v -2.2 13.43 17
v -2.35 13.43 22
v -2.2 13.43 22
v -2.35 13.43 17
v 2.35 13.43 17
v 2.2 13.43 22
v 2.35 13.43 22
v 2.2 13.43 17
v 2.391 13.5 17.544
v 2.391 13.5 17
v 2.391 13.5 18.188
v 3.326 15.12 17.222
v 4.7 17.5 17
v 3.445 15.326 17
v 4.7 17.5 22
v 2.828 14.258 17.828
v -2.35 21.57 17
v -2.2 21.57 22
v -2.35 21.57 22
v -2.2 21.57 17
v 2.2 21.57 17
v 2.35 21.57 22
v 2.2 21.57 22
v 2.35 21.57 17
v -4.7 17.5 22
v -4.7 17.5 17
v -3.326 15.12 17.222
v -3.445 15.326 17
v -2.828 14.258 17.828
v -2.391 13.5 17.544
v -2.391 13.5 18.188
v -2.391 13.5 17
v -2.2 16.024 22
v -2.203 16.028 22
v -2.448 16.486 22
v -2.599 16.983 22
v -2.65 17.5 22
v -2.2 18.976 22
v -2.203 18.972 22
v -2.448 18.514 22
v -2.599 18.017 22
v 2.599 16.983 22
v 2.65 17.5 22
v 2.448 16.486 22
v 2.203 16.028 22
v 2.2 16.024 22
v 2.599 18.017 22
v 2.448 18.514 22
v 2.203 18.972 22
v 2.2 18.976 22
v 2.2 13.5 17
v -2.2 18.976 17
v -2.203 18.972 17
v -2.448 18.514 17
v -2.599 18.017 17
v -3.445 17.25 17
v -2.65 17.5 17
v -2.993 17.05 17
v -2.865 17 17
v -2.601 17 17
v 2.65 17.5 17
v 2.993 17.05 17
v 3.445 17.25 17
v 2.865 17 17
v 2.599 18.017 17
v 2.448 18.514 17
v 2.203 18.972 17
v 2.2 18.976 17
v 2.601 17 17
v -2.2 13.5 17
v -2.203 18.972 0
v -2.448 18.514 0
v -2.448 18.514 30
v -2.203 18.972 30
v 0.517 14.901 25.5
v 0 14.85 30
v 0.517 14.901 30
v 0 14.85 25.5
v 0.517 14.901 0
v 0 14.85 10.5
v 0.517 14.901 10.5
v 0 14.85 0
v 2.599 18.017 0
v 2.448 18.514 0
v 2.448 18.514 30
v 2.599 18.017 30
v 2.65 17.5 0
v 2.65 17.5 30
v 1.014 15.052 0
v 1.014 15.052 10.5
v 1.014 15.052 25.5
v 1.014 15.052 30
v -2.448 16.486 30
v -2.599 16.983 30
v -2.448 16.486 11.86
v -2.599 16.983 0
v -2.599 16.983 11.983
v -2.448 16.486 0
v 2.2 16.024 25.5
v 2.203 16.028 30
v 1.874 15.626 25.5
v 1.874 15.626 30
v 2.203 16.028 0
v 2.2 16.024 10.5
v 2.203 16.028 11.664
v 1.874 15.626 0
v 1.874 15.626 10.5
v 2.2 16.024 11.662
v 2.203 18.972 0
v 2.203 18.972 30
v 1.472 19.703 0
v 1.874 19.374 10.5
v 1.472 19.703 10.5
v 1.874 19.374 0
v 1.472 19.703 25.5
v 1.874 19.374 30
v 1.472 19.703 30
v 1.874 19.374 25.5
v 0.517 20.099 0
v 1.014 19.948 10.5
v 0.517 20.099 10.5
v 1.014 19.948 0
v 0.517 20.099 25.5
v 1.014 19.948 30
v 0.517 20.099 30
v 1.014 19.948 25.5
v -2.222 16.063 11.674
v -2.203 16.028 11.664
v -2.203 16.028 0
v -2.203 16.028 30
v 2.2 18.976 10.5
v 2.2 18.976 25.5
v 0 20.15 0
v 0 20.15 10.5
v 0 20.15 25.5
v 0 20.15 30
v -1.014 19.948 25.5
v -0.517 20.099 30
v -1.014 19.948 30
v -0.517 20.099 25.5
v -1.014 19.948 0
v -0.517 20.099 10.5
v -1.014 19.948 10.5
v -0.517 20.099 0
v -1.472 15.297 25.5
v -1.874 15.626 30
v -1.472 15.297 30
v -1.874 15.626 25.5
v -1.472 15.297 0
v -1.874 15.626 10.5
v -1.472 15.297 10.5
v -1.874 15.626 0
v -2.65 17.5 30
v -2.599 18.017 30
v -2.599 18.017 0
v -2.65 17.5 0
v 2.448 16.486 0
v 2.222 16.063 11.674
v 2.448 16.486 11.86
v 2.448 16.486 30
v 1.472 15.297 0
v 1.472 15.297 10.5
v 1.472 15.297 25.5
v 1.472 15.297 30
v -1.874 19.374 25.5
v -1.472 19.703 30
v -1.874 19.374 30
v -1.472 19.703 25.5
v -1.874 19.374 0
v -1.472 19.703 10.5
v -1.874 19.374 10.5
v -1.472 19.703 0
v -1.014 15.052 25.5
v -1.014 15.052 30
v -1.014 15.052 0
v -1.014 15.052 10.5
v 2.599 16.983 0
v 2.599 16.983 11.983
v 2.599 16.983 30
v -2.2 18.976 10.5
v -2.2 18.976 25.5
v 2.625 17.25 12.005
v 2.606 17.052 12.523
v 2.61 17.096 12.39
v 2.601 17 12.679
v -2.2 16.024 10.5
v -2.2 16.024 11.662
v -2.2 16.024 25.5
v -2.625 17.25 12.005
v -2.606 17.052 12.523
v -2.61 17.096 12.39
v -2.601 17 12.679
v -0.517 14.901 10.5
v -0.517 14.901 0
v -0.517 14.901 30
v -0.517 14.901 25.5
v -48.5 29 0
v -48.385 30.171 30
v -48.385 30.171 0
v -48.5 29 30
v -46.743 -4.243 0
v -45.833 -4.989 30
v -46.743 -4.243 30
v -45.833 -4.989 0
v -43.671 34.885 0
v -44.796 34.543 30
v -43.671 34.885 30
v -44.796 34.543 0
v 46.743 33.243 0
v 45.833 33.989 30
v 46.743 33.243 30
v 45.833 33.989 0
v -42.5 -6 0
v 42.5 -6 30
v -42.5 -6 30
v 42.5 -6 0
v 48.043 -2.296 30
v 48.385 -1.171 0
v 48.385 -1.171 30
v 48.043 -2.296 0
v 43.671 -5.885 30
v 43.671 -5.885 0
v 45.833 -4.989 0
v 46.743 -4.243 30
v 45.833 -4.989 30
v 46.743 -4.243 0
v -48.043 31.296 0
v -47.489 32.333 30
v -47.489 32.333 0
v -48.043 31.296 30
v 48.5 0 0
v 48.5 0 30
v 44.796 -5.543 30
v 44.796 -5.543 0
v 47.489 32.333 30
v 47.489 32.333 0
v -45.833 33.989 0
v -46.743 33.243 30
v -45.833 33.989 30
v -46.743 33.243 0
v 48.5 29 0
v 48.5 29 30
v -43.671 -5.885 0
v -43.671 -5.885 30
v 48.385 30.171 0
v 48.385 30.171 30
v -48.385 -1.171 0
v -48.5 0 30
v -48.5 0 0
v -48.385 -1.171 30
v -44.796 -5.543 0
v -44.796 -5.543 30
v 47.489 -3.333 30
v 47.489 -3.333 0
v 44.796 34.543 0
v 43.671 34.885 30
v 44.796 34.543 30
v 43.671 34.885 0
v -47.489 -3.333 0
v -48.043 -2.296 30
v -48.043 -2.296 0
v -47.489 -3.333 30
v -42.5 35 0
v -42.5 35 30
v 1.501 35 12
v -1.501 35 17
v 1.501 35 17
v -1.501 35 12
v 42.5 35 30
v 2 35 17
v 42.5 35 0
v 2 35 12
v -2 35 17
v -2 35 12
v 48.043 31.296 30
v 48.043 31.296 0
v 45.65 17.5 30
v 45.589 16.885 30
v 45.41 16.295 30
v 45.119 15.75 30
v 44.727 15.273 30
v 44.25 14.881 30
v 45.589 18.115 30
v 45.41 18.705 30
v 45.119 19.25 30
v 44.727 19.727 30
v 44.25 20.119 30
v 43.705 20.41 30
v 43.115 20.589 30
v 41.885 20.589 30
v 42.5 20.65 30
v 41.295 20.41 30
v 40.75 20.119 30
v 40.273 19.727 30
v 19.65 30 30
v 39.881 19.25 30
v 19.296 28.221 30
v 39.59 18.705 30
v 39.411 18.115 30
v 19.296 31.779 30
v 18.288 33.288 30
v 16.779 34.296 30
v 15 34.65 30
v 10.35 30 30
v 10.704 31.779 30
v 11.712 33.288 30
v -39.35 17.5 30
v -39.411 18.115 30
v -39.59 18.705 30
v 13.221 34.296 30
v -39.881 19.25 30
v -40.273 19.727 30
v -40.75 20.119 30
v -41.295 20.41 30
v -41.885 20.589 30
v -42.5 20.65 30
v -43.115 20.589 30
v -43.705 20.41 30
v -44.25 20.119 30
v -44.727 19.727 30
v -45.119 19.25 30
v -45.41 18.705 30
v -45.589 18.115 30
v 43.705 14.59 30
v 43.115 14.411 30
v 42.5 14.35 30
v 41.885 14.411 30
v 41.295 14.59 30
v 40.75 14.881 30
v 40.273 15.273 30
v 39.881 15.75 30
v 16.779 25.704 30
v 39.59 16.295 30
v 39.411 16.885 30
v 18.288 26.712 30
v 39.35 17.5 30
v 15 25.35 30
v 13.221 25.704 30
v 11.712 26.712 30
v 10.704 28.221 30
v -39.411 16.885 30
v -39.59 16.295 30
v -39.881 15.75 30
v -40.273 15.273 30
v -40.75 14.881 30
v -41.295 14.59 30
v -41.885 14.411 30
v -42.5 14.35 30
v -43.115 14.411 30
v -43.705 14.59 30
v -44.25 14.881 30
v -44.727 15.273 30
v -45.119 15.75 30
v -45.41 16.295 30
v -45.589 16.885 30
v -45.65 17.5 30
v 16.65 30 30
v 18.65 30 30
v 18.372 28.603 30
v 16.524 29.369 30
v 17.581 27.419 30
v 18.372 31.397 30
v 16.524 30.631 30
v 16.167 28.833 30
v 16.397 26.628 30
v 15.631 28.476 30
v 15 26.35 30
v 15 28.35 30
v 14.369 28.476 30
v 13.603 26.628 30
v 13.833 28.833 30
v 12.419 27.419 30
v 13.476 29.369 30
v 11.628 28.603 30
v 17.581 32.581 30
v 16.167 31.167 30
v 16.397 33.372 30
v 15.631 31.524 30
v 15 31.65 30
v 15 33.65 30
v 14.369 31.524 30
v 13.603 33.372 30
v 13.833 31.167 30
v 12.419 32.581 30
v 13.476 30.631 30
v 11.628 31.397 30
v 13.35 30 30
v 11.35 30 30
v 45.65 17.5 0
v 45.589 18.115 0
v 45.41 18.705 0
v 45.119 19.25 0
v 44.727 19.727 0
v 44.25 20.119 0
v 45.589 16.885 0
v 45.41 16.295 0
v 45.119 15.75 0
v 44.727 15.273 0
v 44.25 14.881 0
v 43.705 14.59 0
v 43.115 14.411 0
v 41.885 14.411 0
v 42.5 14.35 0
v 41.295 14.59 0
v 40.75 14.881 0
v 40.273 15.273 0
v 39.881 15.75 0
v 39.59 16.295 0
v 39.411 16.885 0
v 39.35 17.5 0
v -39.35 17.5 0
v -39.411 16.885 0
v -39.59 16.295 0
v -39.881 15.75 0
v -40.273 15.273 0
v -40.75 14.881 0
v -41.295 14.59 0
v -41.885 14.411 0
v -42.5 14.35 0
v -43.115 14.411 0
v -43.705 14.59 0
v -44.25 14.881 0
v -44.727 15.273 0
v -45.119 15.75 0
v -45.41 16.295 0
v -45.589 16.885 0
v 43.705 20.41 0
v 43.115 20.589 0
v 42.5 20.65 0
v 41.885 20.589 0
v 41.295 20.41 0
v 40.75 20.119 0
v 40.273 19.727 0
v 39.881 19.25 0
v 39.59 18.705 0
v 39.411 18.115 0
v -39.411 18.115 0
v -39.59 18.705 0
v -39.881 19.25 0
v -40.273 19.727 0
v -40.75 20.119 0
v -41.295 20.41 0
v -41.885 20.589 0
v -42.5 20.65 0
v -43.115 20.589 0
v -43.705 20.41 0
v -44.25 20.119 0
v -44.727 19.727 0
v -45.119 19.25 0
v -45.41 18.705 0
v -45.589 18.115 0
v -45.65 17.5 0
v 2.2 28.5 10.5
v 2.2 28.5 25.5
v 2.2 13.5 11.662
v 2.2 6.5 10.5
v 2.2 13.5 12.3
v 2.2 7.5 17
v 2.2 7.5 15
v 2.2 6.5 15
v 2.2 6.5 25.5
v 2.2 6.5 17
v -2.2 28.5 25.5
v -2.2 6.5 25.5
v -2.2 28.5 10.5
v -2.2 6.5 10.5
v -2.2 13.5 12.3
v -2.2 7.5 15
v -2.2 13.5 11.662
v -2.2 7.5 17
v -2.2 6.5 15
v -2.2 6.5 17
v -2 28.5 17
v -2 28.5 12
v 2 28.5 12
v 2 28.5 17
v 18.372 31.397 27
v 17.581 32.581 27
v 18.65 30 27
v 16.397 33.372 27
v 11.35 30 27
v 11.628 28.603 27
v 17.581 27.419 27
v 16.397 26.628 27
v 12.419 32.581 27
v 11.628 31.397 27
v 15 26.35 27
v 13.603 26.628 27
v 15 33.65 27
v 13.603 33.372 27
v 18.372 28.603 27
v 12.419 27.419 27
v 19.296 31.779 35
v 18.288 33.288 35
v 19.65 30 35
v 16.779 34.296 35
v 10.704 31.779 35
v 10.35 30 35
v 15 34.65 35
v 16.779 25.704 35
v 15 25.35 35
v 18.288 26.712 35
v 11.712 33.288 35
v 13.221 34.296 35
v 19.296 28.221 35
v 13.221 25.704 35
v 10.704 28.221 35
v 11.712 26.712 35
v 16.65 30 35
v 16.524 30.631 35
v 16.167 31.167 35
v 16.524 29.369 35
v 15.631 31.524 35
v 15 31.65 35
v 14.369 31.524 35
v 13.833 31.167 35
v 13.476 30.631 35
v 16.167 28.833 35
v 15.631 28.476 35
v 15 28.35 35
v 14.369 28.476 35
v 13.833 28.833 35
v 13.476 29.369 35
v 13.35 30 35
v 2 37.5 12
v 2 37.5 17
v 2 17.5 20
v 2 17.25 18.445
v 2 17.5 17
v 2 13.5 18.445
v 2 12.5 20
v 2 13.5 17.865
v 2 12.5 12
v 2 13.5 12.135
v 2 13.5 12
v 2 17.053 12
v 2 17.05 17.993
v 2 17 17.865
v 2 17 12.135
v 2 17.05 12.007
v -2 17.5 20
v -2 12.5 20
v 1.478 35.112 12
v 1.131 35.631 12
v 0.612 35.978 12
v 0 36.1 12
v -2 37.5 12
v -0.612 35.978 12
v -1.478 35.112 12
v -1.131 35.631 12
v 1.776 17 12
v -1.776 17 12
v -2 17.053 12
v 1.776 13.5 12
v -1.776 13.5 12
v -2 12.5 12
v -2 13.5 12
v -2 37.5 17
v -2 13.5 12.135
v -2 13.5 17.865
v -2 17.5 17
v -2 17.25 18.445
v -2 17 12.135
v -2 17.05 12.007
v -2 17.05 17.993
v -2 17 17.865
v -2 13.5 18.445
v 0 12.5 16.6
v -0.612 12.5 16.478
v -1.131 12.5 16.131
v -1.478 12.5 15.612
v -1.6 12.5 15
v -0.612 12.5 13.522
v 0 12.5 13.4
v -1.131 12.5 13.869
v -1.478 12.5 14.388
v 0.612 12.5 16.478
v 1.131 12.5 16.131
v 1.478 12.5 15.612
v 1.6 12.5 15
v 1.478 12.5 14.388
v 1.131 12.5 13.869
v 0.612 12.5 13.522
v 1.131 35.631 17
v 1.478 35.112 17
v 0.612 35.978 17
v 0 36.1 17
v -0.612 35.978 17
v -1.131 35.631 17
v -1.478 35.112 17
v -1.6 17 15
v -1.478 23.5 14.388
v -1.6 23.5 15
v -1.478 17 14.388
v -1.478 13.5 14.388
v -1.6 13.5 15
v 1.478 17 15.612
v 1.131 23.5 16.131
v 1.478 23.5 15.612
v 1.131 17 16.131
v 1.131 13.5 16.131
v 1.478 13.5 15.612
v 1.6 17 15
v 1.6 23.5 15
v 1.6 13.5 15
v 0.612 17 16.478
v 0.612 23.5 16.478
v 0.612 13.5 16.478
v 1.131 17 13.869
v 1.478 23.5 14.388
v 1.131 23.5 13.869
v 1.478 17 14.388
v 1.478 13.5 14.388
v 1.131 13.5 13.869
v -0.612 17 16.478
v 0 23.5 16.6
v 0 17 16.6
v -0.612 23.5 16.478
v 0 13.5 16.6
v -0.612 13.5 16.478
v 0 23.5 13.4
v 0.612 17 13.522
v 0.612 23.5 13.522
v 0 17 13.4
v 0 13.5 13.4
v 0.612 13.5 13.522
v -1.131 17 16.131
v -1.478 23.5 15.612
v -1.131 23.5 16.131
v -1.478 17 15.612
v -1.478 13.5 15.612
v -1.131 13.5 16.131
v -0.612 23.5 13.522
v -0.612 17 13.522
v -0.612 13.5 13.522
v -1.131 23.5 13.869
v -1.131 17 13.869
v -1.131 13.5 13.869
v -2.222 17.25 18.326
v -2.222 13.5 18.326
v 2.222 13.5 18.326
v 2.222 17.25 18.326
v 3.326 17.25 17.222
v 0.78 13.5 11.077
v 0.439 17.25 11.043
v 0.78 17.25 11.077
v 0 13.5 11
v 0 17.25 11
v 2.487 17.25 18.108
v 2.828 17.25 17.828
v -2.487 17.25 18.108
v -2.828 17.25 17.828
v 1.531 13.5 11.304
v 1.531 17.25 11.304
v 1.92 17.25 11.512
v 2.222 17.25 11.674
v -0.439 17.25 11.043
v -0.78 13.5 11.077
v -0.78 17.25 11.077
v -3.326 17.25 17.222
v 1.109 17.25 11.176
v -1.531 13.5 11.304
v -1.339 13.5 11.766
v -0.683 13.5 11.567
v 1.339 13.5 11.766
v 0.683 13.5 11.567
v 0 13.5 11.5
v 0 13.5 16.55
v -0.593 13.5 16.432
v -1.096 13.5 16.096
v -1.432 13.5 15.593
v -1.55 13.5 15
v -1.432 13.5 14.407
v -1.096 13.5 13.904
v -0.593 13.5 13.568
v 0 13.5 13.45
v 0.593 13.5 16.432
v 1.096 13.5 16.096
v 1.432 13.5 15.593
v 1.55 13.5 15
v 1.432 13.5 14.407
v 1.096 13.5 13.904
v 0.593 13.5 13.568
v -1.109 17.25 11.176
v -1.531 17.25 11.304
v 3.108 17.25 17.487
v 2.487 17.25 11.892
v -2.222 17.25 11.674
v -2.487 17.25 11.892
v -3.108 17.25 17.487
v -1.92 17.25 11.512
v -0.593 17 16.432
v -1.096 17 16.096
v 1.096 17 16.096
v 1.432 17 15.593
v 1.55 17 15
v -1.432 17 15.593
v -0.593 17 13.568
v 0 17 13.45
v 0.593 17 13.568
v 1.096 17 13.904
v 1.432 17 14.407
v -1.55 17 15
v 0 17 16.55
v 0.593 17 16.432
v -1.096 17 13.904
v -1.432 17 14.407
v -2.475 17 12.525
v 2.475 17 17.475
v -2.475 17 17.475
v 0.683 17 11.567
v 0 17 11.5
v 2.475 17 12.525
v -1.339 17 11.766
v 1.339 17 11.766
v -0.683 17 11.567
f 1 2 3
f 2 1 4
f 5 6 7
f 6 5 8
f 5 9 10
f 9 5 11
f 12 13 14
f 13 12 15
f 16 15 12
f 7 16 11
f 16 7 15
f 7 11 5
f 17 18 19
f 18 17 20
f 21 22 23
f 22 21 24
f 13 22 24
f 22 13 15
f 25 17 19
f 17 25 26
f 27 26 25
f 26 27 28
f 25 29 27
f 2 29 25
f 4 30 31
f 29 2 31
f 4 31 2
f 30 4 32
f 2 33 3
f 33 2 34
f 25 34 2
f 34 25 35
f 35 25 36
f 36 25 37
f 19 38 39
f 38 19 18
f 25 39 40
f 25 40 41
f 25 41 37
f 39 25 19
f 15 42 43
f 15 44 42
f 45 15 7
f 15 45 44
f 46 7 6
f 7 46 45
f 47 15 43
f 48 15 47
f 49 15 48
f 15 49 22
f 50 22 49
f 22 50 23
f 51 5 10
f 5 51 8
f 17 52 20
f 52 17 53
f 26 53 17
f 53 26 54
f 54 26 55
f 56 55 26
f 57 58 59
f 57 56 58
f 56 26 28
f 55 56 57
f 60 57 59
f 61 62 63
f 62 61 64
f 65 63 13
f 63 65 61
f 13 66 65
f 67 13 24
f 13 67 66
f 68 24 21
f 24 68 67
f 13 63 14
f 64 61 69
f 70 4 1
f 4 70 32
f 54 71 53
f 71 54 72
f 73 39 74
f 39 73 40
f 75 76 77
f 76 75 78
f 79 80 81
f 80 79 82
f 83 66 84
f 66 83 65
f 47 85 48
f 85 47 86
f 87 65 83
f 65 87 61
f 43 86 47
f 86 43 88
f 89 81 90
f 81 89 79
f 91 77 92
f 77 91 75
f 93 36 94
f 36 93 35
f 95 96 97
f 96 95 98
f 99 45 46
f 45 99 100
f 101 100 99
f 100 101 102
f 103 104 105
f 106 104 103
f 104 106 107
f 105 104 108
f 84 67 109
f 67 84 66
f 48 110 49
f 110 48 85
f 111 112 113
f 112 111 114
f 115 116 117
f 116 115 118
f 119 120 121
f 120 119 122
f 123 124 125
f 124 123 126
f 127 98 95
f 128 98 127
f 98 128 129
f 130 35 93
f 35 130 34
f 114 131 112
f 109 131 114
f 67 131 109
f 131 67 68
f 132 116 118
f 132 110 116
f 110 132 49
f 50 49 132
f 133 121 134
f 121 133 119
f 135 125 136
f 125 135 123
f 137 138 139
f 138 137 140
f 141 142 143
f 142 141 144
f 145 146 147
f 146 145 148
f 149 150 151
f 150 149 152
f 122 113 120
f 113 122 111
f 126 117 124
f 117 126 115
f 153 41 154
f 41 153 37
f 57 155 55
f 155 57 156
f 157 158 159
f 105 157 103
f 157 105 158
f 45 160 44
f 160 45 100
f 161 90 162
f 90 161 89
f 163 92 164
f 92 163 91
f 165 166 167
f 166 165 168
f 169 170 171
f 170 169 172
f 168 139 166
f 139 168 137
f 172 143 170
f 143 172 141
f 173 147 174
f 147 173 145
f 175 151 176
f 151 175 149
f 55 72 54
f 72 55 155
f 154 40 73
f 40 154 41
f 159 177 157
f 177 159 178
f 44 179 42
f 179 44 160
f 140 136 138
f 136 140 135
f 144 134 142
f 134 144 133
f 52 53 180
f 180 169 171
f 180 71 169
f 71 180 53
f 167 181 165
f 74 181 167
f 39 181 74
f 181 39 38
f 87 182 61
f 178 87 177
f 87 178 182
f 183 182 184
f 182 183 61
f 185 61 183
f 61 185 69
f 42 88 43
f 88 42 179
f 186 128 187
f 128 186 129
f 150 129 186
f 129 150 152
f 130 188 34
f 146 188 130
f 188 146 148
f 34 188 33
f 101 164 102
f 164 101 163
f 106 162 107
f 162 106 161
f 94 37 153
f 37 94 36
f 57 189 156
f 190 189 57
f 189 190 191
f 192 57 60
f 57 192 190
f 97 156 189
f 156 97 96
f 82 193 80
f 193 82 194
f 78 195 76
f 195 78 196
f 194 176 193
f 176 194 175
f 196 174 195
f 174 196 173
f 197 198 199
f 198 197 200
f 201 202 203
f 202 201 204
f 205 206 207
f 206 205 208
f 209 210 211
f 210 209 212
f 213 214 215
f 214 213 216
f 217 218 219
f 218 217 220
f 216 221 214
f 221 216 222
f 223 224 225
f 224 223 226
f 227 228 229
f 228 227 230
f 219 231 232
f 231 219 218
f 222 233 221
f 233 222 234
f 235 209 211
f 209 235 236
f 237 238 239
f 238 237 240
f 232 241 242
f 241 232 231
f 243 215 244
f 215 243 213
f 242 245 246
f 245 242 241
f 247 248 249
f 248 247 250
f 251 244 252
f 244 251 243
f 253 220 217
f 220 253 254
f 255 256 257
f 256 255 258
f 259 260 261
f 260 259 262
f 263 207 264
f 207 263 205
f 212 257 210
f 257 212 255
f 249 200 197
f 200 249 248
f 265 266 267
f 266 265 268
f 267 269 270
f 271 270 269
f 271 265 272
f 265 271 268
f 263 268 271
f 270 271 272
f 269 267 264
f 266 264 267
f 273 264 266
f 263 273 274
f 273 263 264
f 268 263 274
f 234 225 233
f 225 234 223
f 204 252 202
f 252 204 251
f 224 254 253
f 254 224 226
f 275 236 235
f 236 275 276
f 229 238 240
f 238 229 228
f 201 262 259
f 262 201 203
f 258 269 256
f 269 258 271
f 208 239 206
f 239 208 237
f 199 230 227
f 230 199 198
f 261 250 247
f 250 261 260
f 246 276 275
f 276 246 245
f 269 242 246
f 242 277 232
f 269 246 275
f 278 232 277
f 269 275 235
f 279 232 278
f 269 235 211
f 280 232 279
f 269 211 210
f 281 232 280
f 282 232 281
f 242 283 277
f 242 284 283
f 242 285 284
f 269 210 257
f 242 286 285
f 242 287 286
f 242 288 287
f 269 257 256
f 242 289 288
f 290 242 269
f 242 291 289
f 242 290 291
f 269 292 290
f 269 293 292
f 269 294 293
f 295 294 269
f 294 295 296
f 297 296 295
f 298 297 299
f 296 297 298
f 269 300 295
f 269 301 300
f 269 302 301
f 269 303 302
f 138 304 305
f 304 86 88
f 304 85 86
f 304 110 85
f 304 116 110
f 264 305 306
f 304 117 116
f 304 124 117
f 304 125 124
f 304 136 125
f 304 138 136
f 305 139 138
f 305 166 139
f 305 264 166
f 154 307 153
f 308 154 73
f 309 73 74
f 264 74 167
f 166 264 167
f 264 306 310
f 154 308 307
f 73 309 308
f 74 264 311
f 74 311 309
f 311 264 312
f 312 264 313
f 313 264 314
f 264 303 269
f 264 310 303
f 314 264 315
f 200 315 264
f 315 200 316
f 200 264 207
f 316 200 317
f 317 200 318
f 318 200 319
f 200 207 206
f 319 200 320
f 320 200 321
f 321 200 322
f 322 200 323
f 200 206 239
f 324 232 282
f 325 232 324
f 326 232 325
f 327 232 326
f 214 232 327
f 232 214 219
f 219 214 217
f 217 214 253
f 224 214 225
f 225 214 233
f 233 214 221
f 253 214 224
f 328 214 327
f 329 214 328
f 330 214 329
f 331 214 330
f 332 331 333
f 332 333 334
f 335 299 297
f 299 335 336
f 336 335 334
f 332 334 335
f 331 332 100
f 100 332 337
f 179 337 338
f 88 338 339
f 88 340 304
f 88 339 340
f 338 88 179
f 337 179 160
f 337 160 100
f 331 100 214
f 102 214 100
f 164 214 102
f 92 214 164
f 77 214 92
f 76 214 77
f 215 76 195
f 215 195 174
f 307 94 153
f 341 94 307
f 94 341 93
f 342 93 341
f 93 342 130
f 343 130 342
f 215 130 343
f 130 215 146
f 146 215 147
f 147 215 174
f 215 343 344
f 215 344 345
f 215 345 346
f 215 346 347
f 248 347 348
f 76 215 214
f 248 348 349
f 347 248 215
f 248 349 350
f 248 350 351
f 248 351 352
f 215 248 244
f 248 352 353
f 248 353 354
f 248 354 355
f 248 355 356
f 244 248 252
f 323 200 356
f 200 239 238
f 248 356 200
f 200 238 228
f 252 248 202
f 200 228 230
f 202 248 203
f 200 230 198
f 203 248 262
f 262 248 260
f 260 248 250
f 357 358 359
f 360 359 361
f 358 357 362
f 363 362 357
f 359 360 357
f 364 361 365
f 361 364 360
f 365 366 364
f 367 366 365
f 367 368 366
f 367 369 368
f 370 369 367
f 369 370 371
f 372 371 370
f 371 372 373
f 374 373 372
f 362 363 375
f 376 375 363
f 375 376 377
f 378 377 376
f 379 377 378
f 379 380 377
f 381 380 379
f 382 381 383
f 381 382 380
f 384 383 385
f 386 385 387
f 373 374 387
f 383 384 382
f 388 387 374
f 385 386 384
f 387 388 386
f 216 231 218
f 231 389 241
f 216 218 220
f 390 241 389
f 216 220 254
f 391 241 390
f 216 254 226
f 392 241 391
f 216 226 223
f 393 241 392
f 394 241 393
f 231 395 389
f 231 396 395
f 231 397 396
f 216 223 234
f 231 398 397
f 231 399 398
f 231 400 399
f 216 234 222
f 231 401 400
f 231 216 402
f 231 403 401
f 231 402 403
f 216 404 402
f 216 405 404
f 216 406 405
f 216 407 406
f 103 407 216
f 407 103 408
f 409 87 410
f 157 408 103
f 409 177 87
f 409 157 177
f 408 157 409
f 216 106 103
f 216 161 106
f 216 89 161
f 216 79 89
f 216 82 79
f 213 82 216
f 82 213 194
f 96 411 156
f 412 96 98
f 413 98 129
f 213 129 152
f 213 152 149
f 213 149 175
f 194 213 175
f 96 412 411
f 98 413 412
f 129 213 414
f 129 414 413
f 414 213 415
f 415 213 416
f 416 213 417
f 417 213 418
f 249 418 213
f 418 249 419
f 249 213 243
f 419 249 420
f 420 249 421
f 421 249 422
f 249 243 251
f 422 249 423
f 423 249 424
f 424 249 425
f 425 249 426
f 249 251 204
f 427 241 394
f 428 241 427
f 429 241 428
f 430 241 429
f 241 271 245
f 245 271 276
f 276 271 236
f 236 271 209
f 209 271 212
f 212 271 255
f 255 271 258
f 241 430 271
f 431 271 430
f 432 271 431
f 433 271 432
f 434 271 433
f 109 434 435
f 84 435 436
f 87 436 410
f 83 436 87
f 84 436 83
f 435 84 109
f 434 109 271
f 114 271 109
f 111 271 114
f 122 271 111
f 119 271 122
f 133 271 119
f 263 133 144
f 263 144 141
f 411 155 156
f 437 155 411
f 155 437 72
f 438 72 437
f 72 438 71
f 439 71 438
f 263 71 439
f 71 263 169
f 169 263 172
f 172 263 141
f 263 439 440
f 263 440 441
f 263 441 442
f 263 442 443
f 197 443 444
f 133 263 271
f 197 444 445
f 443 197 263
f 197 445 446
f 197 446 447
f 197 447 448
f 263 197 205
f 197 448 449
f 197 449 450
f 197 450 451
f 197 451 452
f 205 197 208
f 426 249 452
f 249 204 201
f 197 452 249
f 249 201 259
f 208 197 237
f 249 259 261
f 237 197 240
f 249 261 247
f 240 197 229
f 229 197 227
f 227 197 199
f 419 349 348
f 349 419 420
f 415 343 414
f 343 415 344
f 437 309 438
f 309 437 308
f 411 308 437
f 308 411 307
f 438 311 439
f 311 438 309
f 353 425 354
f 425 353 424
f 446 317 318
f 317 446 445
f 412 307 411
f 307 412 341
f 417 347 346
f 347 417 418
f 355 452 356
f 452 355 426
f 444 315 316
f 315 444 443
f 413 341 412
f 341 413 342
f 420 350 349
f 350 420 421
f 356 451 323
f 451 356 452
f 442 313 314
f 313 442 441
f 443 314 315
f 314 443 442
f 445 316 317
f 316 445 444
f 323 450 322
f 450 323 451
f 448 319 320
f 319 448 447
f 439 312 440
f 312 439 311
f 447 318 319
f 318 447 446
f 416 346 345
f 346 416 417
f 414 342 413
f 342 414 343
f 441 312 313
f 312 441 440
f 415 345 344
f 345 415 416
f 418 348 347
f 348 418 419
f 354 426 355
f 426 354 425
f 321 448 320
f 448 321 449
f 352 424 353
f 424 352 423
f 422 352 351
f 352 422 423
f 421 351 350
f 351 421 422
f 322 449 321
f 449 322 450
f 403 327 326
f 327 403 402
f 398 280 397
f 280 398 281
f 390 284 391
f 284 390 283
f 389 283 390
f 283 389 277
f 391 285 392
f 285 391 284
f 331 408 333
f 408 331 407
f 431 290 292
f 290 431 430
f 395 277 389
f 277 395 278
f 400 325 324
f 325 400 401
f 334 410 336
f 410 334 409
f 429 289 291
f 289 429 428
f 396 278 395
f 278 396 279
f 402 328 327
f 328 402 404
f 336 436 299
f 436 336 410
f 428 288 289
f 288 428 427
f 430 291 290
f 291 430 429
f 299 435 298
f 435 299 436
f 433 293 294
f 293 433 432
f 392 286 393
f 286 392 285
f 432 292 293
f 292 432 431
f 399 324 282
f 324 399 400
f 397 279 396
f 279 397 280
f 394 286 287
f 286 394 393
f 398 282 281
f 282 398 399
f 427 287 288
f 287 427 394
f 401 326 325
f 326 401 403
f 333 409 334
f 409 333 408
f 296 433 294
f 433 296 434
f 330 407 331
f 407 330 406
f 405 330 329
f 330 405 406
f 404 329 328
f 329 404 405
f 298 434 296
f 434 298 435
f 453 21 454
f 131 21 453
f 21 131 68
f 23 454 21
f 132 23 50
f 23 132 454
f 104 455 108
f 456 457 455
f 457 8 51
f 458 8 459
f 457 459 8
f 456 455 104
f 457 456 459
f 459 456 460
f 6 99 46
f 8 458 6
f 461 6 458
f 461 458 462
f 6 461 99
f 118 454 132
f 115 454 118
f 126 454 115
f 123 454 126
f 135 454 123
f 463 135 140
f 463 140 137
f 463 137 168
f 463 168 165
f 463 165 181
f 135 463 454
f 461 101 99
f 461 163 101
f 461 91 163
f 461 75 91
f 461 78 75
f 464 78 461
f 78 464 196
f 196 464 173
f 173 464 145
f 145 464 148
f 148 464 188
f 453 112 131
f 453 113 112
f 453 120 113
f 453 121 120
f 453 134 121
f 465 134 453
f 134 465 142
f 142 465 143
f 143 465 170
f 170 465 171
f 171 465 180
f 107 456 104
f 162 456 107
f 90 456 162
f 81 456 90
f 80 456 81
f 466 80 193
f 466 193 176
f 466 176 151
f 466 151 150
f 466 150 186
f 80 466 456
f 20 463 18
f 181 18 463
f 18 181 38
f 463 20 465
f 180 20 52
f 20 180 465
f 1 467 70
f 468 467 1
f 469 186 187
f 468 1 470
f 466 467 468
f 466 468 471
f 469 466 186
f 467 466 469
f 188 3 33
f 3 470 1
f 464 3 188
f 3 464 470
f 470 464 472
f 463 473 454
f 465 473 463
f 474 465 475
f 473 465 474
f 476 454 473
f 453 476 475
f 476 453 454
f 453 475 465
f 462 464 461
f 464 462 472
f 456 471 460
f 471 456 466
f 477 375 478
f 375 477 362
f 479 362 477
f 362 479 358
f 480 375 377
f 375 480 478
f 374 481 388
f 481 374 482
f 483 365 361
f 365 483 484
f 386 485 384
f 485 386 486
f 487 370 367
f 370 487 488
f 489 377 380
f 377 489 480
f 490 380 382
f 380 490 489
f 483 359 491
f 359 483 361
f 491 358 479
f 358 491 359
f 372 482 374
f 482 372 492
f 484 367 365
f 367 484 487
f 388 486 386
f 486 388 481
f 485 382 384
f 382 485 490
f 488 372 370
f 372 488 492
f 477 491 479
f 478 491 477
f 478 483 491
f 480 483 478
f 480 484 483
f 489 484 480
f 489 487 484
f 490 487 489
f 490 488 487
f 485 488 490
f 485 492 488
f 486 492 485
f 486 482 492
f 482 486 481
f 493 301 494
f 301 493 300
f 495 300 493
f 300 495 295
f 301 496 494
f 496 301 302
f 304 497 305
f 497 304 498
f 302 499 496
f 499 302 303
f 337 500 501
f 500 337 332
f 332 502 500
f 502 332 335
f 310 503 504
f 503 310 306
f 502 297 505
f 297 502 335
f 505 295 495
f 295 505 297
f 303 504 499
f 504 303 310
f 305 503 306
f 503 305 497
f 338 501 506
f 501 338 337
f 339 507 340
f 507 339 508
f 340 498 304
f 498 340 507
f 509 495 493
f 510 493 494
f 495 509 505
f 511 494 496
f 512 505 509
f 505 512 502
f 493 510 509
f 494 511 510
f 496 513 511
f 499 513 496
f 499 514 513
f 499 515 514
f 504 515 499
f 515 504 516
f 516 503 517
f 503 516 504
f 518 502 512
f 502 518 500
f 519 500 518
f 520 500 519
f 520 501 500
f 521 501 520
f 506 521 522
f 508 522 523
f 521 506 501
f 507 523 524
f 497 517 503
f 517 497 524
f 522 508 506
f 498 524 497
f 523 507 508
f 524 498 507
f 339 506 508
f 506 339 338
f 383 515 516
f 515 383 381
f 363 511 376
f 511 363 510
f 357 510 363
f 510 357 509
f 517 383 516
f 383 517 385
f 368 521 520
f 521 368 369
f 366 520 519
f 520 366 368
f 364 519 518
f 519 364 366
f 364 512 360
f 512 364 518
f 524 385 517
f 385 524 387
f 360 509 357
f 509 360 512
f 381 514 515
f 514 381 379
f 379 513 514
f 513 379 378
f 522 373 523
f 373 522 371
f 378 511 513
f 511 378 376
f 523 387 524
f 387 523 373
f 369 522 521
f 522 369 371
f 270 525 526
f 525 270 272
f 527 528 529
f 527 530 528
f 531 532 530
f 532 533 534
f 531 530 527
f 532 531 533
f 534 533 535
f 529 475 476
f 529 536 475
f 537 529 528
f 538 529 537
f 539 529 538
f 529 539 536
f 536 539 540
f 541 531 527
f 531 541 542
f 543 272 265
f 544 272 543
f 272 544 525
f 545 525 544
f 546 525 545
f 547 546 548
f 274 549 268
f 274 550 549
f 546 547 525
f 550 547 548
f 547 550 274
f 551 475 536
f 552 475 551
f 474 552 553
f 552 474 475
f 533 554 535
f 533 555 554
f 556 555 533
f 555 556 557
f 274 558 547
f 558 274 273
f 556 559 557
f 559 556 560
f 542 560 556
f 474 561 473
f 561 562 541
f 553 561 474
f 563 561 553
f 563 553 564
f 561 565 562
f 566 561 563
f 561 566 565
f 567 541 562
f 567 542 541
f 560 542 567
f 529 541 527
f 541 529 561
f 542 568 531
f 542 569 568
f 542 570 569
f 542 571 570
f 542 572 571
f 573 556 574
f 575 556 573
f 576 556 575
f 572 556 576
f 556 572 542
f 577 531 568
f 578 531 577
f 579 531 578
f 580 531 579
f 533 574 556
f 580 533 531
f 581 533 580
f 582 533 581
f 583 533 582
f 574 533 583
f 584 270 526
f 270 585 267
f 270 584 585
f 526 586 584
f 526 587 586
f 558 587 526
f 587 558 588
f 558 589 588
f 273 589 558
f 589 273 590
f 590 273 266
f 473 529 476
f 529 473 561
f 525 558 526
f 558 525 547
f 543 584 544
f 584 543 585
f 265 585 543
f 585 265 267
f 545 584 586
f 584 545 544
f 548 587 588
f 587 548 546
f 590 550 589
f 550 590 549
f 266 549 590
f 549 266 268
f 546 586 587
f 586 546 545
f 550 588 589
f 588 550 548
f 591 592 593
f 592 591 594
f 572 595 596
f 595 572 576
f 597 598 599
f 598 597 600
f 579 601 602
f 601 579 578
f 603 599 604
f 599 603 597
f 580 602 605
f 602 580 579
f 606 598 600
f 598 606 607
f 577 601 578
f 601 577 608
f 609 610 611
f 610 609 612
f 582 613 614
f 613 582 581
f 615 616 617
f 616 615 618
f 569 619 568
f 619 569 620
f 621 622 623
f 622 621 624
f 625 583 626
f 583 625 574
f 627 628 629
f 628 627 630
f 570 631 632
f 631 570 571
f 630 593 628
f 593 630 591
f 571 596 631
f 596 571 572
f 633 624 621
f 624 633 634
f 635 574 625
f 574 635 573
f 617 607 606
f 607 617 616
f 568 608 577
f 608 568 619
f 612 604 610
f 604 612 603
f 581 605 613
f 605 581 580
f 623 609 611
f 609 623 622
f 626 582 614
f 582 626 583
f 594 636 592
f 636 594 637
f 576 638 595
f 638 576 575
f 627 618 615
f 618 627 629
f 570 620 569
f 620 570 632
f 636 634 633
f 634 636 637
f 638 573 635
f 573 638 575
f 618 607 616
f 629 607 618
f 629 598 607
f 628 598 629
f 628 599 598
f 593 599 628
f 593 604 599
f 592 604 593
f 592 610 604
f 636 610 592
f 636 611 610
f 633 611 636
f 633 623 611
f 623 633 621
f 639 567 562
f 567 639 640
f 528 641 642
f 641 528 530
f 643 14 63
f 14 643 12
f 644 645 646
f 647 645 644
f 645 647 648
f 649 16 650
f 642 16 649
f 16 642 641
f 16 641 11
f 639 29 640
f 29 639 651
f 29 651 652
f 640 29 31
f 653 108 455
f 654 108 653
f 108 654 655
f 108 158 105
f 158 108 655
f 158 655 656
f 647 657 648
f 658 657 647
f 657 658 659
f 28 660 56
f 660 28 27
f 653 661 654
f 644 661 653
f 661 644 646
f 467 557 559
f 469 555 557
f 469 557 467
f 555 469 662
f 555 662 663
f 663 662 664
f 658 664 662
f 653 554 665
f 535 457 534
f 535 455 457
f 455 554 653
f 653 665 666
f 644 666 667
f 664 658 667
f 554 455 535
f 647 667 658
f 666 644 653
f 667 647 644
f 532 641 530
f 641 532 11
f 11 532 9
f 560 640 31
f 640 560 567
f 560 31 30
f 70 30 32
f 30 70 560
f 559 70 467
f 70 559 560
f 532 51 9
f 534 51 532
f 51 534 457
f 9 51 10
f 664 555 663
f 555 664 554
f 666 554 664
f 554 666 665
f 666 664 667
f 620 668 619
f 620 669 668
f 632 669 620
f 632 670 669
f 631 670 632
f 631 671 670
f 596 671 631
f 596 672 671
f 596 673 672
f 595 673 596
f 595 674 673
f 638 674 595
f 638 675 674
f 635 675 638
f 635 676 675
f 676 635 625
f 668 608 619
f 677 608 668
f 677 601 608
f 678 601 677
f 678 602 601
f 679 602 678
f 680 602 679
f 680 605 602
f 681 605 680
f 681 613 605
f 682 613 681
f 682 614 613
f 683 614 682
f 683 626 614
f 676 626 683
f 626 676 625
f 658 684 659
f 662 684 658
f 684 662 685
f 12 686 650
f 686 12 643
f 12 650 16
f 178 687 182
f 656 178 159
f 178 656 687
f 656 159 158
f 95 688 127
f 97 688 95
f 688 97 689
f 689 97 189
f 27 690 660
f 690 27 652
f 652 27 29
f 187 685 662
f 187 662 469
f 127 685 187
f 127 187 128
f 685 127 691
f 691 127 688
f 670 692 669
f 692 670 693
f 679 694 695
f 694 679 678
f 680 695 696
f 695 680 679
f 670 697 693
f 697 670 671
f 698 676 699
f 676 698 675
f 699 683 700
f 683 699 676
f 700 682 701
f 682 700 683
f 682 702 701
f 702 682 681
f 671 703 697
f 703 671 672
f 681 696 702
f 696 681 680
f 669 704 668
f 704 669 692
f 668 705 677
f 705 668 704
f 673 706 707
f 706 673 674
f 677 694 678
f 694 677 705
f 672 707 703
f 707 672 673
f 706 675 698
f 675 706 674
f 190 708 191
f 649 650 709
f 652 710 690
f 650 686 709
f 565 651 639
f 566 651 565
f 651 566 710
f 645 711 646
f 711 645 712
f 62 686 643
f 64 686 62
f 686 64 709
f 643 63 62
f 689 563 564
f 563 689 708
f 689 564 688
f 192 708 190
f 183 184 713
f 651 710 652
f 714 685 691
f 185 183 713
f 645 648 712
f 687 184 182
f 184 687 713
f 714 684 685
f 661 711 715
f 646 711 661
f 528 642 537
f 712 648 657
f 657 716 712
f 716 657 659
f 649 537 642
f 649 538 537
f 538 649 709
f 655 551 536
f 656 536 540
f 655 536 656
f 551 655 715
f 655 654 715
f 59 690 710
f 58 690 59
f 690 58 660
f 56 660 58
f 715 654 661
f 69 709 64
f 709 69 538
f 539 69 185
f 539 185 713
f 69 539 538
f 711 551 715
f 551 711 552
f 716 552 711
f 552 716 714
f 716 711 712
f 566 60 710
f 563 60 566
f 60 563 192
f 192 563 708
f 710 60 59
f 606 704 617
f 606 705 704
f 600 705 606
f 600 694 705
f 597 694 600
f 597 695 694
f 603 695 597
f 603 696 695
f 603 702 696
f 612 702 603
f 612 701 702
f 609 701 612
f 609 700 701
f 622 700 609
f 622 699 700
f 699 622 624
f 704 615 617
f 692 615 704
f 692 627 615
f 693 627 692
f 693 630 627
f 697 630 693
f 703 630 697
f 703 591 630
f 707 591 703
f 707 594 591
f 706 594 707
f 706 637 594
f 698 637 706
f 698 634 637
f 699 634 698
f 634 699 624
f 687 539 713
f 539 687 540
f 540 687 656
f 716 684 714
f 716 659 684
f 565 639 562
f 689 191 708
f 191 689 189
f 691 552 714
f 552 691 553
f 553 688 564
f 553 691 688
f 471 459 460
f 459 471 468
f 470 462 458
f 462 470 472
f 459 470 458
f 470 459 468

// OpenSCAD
/**
 * roller_carriage.scad — TM-ROLLER-001 Rev A
 * Roller Contact Carriage Assembly
 *
 * Slides along two 6mm guide rods parallel to the coil former.
 * Spring-loaded silver-plated roller bearing presses against coil wire.
 * M5 leadscrew nut drives carriage along coil axis.
 *
 * Print settings:
 *   Material:    PETG (dimensional stability)
 *   Infill:      50% grid
 *   Wall:        4 perimeters (heavy walls for rod holes)
 *   Layer:       0.15mm (tight tolerances on rod bores)
 *   Orientation: Flat face down
 *   Supports:    Yes, for spring pocket
 *
 * Print envelope: 95mm × 50mm × 40mm
 */

// ─── Parameters ───────────────────────────────────────────────────────────────

// Guide rods
rod_dia         = 6.0;   // Rod diameter
rod_clearance   = 0.15;  // Clearance for sliding fit
rod_bore_dia    = rod_dia + 2 * rod_clearance;  // 6.3mm
rod_spacing     = 85.0;  // Center-to-center distance between rods
                          // = former_od + 2×10mm side offsets = 63.5 + 21.5 = 85mm

// Carriage body
body_width      = rod_spacing + rod_dia + 6;  // Total body width (~97mm)
body_depth      = 35.0;   // Depth (parallel to former axis)
body_height     = 30.0;   // Height of carriage body

// Roller assembly
roller_dia      = 8.0;    // Roller bearing OD (silver-plated)
roller_width    = 4.0;    // Roller contact width
roller_shaft    = 3.0;    // Roller shaft (M3 stainless)
roller_arm_len  = 20.0;   // Length of spring-loaded arm
roller_arm_thick = 4.0;

// Spring pocket (compression spring)
spring_od       = 5.0;
spring_id_bore  = 5.2;    // Bore for spring
spring_depth    = 15.0;   // Pocket depth

// Spring pre-load: ~0.5N contact force
// Spring: 5mm OD, 15mm free length, ~0.1N/mm rate → 5mm compression = 0.5N

// Leadscrew nut
ls_pitch        = 2.0;    // Leadscrew pitch (mm)
ls_dia          = 5.0;    // M5 leadscrew diameter
ls_nut_od       = 9.0;    // M5 hex nut flat-to-flat
ls_nut_thick    = 4.0;    // M5 nut height

// Wiper terminal
wiper_od        = 3.3;    // M3 screw hole for wiper lug
wiper_boss_h    = 5.0;    // Boss height for wiper mount

// Coil centerline height (from rod centerline to coil OD surface)
// Rods are 10mm outside the former OD (31.75 + 10 = 41.75mm from center)
// Rod center is at y = former_od/2 + rail_offset = 31.75 + 10 = 41.75mm
// Coil OD surface is at y = former_od/2 = 31.75mm from coil axis
// Roller must reach coil OD: carriage needs to position roller at y = 31.75mm

coil_surface_y  = 31.75 + 4.0;  // Distance from rod line to coil surface + arm clearance

// ─── Modules ──────────────────────────────────────────────────────────────────

module rod_bore() {
    // Linear bearing bore (IGUS RJUM-01-06 or plain bore with PTFE lining)
    cylinder(h = body_depth + 1, d = rod_bore_dia, $fn = 32);
}

module leadscrew_nut_pocket() {
    // Hex pocket for M5 anti-backlash nut (or simple hex nut)
    translate([0, 0, body_depth / 2])
    union() {
        cylinder(h = ls_nut_thick + 1, d = ls_nut_od + 0.4, $fn = 6);
        // Through hole for leadscrew
        translate([0, 0, -body_depth/2 - 0.5])
            cylinder(h = body_depth + 1, d = ls_dia + 0.3, $fn = 32);
    }
}

module spring_pocket() {
    cylinder(h = spring_depth, d = spring_id_bore, $fn = 24);
}

module roller_arm_slot() {
    // Slot for roller arm to pivot through body
    cube([roller_arm_thick + 0.4, roller_arm_len + 2, body_height / 2], center = true);
}

module carriage_body() {
    difference() {
        // Main body block
        hull() {
            translate([-body_width/2 + 6, 0, 0])
                cylinder(h = body_height, r = 6, $fn = 32);
            translate([ body_width/2 - 6, 0, 0])
                cylinder(h = body_height, r = 6, $fn = 32);
            translate([-body_width/2 + 6, body_depth - 6, 0])
                cylinder(h = body_height, r = 6, $fn = 32);
            translate([ body_width/2 - 6, body_depth - 6, 0])
                cylinder(h = body_height, r = 6, $fn = 32);
        }

        // Left rod bore
        translate([-rod_spacing/2, body_depth/2, -0.5])
            rod_bore();

        // Right rod bore
        translate([rod_spacing/2, body_depth/2, -0.5])
            rod_bore();

        // Leadscrew hole (center, along axis)
        translate([0, body_depth/2, -0.5])
            leadscrew_nut_pocket();

        // Spring pocket (top center, for roller arm spring)
        translate([0, body_depth/2, body_height - spring_depth])
            spring_pocket();

        // Roller arm slot
        translate([0, body_depth/2, body_height * 0.6])
            roller_arm_slot();

        // Wiper terminal boss cutout (to be filled with boss)
        translate([15, body_depth - 5, body_height - 3])
            cylinder(h = wiper_boss_h + 1, d = wiper_od + 4, $fn = 16);
    }

    // Wiper terminal boss
    translate([15, body_depth - 5, body_height])
    difference() {
        cylinder(h = wiper_boss_h, d = wiper_od + 6, $fn = 16);
        translate([0, 0, -0.5])
            cylinder(h = wiper_boss_h + 1, d = wiper_od, $fn = 16);
    }
}

module roller_arm() {
    // Pivoting arm that holds roller bearing, spring-loaded downward
    difference() {
        union() {
            // Main arm
            cube([roller_arm_thick, roller_arm_len, 5], center = false);
            // Roller mount fork at bottom
            translate([0, 0, 0])
            union() {
                translate([0, -5, 0]) cube([roller_arm_thick, 5, 8]);
                translate([roller_arm_thick + 3, -5, 0]) cube([roller_arm_thick, 5, 8]);
            }
        }
        // Pivot pin hole (top of arm)
        translate([roller_arm_thick/2, roller_arm_len - 3, -0.5])
            cylinder(h = 6, d = 3.2, $fn = 16);
        // Roller shaft hole (bottom of arm, fork)
        translate([roller_arm_thick/2, -2, 3])
            rotate([90, 0, 0])
            translate([0, 0, -roller_arm_thick - 4])
            cylinder(h = roller_arm_thick * 2 + 8, d = roller_shaft + 0.2, $fn = 16);
    }
}

module roller_bearing() {
    // Simplified roller representation (actual: silver-plated ball bearing or
    // turned brass roller, silver-plated, on M3 stainless shaft)
    color("silver")
    difference() {
        cylinder(h = roller_width, d = roller_dia, $fn = 32, center = true);
        // Shaft bore
        cylinder(h = roller_width + 1, d = roller_shaft + 0.1, $fn = 16, center = true);
        // Chamfer edges
        translate([0, 0,  roller_width/2])
            cylinder(h = 0.5, d1 = roller_dia - 1, d2 = roller_dia + 1, $fn = 32);
        translate([0, 0, -roller_width/2])
            cylinder(h = 0.5, d1 = roller_dia + 1, d2 = roller_dia - 1, $fn = 32);
    }
}

// ─── Position Indicator Groove ────────────────────────────────────────────────

module indicator_pointer() {
    // V-shaped pointer on carriage front face, aligns with position scale
    translate([0, -0.5, body_height/2])
    linear_extrude(height = 2)
    polygon(points = [[0, 0], [-3, 8], [3, 8]]);
}

// ─── Assembly ─────────────────────────────────────────────────────────────────

module carriage_assembly(show_roller = true) {
    carriage_body();
    indicator_pointer();

    if (show_roller) {
        // Roller arm in position (pointing down toward coil)
        translate([0, body_depth/2, body_height * 0.4])
        rotate([0, 0, 0]) {
            color("gray")
            translate([-roller_arm_thick/2, 0, 0])
                roller_arm();
            // Roller at bottom of arm
            translate([0, -2, 3])
                rotate([90, 0, 0])
                translate([0, 0, 0])
                roller_bearing();
        }
    }
}

// ─── Render ───────────────────────────────────────────────────────────────────

$fn = 32;

// Print carriage body and arm separately
module print_carriage_body() {
    carriage_body();
}

module print_roller_arm() {
    translate([0, 0, 0])
    roller_arm();
}

// Default: show full assembly
carriage_assembly(show_roller = true);

// To print just the body:
// print_carriage_body();

// To print just the roller arm:
// translate([120, 0, 0]) print_roller_arm();

// ─── Notes ────────────────────────────────────────────────────────────────────
// After printing:
// 1. Press M5 hex nut into leadscrew pocket (light press-fit, secure with CA glue)
// 2. Install IGUS RJUM-01-06 linear bearings in rod bores (or use plain bore + grease)
// 3. Insert M3×20 stainless pivot pin through body and arm top
// 4. Thread roller shaft (M3×20) through fork and roller bearing
// 5. Install compression spring in spring pocket
// 6. Adjust spring pre-load: roller should press coil with ~0.5N force
// 7. Silver-plate roller: coat with silver conductive paint or use
//    purchased silver-plated brass roller bearing (McMaster 5912K713 equiv)
// 8. Attach wiper terminal lug at boss with M3 screw
// 9. Connect flexible wire from wiper terminal to main terminal
